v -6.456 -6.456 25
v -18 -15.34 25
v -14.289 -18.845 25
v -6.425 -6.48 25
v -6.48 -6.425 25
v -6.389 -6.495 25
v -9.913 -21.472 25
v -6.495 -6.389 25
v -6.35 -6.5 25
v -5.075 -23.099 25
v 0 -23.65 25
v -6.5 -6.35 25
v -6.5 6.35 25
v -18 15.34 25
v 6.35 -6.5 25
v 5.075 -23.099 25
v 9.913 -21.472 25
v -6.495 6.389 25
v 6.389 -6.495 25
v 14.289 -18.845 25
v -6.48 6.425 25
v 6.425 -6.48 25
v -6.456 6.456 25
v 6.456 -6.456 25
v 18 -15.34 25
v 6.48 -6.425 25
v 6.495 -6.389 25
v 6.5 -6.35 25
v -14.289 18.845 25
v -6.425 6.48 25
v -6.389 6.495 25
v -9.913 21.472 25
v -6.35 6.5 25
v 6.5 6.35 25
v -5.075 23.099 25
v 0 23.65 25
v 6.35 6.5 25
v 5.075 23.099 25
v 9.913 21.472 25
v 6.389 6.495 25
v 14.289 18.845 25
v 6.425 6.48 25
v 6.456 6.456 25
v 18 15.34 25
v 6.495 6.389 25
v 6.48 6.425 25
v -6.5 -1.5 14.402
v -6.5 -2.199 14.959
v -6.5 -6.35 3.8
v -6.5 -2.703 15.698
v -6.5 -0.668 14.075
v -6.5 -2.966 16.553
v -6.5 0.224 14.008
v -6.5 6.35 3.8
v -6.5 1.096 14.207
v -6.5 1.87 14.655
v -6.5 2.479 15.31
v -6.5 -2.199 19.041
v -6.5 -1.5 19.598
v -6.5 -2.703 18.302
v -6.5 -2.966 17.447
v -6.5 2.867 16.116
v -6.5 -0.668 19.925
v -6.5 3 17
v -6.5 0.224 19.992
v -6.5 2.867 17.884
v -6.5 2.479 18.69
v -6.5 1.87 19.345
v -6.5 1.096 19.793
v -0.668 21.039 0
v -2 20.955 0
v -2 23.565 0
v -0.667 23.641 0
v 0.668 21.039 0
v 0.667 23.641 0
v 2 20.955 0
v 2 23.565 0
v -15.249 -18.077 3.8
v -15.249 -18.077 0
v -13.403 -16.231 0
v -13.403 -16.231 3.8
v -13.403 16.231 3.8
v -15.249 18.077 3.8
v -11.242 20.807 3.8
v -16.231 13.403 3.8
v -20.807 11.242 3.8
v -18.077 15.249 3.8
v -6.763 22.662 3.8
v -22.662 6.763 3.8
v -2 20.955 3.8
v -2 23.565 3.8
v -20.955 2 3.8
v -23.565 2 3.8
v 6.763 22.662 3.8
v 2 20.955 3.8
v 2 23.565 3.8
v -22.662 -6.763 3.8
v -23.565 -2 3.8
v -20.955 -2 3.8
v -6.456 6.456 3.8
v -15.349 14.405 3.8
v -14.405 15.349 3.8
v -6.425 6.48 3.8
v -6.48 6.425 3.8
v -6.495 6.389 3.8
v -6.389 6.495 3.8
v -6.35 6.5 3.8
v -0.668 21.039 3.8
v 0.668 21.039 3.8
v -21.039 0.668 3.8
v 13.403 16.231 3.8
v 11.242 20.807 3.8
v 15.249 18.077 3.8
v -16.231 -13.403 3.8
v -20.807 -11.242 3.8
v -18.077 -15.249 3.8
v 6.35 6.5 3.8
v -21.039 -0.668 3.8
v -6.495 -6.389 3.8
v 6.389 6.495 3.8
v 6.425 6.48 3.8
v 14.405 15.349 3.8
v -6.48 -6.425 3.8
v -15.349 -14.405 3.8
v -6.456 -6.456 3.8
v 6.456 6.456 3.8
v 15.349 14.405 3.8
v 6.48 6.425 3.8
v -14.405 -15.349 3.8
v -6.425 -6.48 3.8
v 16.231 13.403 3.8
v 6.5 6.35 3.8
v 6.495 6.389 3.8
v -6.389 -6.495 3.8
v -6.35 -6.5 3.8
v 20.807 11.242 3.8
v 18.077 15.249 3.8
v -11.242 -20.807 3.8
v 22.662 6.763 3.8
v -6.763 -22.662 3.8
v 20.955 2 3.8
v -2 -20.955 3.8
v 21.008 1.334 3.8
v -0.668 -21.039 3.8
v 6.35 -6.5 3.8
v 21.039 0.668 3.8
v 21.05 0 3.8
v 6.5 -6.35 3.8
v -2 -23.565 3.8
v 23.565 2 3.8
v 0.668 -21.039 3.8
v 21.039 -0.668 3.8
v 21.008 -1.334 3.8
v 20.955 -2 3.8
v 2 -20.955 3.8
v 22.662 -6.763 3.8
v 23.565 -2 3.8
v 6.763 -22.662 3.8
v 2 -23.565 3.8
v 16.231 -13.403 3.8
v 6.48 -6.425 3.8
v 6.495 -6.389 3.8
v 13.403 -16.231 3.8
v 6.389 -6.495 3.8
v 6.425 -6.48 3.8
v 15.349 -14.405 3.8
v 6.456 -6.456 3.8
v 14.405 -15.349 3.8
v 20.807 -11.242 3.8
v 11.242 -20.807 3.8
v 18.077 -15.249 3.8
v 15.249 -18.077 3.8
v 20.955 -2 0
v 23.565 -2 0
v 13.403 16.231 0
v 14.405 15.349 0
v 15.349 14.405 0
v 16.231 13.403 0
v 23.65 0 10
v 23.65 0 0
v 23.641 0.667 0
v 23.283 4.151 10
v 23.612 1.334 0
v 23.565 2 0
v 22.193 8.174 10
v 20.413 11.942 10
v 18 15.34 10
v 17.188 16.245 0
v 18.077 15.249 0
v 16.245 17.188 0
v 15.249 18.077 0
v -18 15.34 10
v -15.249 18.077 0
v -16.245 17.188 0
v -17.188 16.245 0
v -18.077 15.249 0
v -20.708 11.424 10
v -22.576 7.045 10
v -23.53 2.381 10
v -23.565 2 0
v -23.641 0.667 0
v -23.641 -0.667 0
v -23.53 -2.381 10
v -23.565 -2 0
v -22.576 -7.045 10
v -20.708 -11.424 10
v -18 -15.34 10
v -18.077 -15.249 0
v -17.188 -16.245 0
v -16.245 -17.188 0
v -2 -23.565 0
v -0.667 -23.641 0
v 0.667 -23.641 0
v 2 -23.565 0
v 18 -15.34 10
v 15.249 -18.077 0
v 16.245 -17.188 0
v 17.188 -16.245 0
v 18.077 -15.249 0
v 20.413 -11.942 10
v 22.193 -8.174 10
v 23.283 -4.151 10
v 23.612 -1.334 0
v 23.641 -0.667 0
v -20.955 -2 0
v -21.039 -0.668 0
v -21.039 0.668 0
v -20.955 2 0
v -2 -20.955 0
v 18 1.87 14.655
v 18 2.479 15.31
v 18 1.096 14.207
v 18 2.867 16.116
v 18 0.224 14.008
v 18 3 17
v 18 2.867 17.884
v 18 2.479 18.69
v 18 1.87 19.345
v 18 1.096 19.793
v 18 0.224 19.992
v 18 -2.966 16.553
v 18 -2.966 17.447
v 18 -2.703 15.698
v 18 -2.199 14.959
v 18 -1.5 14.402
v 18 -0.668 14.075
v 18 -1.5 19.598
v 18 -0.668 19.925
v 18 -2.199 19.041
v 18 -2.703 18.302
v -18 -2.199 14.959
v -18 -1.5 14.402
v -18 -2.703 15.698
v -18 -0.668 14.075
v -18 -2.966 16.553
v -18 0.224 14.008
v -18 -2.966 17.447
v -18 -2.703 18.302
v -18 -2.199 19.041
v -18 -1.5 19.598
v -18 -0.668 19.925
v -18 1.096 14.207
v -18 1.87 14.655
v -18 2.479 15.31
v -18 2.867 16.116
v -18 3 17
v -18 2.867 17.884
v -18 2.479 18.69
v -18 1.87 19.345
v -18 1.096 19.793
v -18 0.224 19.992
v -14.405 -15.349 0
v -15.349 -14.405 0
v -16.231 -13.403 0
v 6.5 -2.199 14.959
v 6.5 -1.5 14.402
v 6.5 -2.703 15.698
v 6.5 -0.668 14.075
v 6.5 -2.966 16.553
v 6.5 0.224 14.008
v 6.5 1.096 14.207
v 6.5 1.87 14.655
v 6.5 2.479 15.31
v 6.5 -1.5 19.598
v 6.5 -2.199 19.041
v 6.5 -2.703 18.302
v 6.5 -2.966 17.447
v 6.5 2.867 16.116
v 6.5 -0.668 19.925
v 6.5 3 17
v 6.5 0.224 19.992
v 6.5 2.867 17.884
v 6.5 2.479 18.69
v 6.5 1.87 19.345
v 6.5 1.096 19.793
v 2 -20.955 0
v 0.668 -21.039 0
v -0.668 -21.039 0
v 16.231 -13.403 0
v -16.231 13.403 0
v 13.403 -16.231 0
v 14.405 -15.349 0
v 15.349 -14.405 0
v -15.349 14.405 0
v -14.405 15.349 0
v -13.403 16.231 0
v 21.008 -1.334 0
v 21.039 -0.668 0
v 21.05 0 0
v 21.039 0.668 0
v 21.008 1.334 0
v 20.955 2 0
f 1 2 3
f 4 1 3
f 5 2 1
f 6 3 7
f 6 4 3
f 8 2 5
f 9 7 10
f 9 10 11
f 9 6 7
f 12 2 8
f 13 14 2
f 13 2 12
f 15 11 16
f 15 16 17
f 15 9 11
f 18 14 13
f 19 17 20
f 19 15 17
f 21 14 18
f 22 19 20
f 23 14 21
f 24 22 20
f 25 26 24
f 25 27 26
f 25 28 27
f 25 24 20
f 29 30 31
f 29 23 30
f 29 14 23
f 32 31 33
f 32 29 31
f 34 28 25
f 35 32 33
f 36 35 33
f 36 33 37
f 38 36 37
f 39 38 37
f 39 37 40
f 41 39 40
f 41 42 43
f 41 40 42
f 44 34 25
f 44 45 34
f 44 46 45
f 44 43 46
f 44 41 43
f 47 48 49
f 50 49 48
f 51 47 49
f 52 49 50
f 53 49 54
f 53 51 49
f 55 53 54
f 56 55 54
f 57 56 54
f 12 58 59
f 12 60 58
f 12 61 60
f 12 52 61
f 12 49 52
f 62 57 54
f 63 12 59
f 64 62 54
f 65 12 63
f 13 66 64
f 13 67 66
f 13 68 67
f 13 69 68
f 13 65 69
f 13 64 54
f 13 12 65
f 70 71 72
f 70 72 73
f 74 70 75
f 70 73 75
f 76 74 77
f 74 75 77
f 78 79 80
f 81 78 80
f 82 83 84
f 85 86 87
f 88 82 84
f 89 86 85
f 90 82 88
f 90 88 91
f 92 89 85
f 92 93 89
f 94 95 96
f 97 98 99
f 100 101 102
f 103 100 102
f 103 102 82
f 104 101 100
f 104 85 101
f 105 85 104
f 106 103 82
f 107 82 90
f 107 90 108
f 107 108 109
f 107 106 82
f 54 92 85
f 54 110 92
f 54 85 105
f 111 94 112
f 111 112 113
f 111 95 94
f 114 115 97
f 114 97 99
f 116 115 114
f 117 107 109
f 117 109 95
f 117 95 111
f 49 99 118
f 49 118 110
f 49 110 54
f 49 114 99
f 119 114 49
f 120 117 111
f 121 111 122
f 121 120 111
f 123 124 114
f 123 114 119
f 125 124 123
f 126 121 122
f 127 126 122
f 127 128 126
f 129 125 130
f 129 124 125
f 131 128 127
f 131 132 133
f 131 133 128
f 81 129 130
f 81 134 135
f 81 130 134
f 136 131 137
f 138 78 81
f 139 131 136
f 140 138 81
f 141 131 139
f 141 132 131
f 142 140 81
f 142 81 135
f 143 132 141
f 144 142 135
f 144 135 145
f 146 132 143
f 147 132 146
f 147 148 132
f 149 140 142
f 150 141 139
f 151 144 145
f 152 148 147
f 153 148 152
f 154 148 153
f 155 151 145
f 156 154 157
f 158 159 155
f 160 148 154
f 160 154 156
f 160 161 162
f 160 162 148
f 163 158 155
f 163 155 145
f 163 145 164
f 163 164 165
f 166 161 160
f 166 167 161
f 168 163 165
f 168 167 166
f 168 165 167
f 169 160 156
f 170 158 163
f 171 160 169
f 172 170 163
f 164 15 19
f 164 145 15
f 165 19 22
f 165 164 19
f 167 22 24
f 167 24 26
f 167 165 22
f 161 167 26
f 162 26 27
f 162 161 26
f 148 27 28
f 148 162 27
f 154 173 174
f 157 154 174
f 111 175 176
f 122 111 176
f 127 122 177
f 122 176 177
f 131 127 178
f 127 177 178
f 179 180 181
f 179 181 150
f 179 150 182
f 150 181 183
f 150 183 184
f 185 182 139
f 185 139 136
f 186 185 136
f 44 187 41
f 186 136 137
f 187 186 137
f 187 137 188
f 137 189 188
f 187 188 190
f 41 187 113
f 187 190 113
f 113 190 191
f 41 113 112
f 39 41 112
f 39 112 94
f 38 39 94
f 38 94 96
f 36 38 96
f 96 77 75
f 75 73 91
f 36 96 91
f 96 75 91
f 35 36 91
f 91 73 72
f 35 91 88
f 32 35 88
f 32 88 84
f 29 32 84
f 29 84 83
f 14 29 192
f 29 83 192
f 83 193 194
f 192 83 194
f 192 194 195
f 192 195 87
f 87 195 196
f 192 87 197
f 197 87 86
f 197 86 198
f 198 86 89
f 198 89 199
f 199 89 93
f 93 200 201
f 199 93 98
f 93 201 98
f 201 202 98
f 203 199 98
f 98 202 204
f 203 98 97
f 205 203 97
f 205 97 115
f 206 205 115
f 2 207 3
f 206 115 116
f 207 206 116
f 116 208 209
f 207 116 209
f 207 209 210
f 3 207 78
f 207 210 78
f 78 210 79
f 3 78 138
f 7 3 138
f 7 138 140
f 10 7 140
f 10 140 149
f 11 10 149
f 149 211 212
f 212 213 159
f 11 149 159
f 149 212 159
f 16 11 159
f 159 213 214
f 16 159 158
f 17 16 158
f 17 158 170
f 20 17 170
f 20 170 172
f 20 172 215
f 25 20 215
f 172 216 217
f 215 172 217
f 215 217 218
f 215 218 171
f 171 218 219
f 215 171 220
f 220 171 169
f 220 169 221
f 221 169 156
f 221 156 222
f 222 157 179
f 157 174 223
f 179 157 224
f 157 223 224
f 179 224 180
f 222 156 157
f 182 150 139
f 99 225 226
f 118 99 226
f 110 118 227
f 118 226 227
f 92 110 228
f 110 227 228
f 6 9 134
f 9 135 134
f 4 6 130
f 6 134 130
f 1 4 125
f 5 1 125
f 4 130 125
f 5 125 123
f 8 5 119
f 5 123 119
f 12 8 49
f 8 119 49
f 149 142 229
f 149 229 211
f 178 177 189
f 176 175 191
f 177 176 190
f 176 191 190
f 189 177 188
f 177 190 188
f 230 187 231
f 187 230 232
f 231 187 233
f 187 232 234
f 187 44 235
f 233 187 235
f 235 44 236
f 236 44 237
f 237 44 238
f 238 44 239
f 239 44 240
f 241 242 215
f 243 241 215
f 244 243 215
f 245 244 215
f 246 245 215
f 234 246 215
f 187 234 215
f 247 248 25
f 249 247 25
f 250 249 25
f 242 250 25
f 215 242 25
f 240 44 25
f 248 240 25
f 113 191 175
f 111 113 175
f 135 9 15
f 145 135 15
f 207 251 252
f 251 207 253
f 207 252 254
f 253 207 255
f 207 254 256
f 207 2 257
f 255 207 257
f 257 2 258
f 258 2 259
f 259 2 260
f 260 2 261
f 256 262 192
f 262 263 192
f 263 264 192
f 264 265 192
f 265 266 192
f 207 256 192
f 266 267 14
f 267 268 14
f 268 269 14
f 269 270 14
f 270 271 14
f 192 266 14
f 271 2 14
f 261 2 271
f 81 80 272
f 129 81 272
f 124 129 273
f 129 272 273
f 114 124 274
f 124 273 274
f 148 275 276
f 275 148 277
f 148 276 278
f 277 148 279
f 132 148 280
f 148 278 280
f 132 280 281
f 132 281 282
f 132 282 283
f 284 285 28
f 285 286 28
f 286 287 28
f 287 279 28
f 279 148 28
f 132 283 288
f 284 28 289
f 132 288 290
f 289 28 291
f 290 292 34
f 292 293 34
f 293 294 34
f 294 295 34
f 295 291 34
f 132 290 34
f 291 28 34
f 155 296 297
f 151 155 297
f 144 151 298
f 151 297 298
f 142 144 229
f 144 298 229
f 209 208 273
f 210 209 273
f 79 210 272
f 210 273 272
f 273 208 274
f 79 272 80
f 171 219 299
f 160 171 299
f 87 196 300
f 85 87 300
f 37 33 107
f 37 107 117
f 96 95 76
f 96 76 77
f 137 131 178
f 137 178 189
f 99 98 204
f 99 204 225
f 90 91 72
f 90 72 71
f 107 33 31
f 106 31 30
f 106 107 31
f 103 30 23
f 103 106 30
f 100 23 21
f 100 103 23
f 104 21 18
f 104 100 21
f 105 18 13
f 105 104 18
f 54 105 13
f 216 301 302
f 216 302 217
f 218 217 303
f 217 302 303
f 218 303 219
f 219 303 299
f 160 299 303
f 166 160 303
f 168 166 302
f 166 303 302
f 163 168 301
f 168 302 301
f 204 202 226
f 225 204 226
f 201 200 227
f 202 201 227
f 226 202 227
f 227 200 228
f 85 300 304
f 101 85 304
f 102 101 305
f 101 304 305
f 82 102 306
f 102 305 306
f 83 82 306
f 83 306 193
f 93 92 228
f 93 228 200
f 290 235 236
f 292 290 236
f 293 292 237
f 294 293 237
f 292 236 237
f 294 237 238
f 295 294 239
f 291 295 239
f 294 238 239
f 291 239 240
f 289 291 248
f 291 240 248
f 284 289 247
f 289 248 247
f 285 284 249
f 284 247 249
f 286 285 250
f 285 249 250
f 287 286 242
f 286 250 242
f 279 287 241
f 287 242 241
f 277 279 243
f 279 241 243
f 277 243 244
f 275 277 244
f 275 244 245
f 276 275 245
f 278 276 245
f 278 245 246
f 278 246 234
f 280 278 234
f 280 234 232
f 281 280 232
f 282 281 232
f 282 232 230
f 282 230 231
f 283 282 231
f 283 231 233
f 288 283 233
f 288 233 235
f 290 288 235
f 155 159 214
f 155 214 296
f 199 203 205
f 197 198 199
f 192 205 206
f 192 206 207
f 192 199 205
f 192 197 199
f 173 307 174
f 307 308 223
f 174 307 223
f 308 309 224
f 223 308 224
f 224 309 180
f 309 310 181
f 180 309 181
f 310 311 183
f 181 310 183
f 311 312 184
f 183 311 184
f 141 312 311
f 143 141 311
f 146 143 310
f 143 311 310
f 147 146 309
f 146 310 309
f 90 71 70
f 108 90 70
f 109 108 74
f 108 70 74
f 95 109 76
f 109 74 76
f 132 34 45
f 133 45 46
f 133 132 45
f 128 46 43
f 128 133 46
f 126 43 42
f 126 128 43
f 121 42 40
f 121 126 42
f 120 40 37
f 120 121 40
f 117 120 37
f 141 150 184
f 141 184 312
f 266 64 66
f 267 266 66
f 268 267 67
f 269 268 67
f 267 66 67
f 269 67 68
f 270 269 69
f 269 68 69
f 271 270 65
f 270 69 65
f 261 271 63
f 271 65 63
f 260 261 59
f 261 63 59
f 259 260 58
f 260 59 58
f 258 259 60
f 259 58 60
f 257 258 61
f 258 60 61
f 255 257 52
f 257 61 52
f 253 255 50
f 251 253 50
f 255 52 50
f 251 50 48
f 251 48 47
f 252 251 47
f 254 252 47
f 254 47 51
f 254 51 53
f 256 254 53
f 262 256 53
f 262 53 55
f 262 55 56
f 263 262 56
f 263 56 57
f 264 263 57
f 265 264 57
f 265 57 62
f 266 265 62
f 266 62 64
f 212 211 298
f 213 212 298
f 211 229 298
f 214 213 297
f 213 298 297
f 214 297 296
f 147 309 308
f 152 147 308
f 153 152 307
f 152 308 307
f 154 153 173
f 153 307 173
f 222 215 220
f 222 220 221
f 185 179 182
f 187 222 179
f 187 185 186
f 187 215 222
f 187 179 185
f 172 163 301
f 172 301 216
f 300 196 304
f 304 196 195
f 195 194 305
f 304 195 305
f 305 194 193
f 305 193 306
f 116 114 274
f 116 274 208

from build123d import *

# Parameters (mm, degrees)
F0_R      = 23.65
F1_DEPTH  = 25
F3_DEPTH  = 3.8
F5_DEPTH  = 15
F6_W      = 13
F6_H      = 13
F7_DEPTH  = 25.001
F8_R      = 0.15
F9_R      = 3
F10_DEPTH = 41.651


with BuildPart() as f1:
    # F0 (on Top) → F1 (new body)
    with BuildSketch(Plane.XY):
        Circle(F0_R)
    extrude(amount=F1_DEPTH)

    # F2 (on face) → F3 (cut)
    with BuildSketch(Plane(origin=(0, 0, 0), x_dir=(1, 0, 0), z_dir=(0, 0, -1))):
        with BuildLine():
            Line((-2, 20.954773), (-2, 23.565282))
            ThreePointArc((-2, 23.565282), (-9.050463, 21.849751), (-15.248957, 18.077384))
            Line((-15.248957, 18.077384), (-13.403048, 16.231475))
            ThreePointArc((-13.403048, 16.231475), (-8.055486, 19.447664), (-2, 20.954773))
        make_face()
        with BuildLine():
            ThreePointArc((21.05, 0), (21.02618, 1.001133), (20.954773, 2))
            ThreePointArc((20.954773, 2), (19.447664, 8.055486), (16.231475, 13.403048))
            ThreePointArc((16.231475, 13.403048), (14.884598, 14.884598), (13.403048, 16.231475))
            ThreePointArc((13.403048, 16.231475), (8.055486, 19.447664), (2, 20.954773))
            ThreePointArc((2, 20.954773), (0, 21.05), (-2, 20.954773))
            ThreePointArc((-2, 20.954773), (-8.055486, 19.447664), (-13.403048, 16.231475))
            ThreePointArc((-13.403048, 16.231475), (-14.884598, 14.884598), (-16.231475, 13.403048))
            ThreePointArc((-16.231475, 13.403048), (-19.447664, 8.055486), (-20.954773, 2))
            ThreePointArc((-20.954773, 2), (-21.05, 0), (-20.954773, -2))
            ThreePointArc((-20.954773, -2), (-19.447664, -8.055486), (-16.231475, -13.403048))
            ThreePointArc((-16.231475, -13.403048), (-14.884598, -14.884598), (-13.403048, -16.231475))
            ThreePointArc((-13.403048, -16.231475), (-8.055486, -19.447664), (-2, -20.954773))
            ThreePointArc((-2, -20.954773), (0, -21.05), (2, -20.954773))
            ThreePointArc((2, -20.954773), (8.055486, -19.447664), (13.403048, -16.231475))
            ThreePointArc((13.403048, -16.231475), (14.884598, -14.884598), (16.231475, -13.403048))
            ThreePointArc((16.231475, -13.403048), (19.447664, -8.055486), (20.954773, -2))
            ThreePointArc((20.954773, -2), (21.02618, -1.001133), (21.05, 0))
        make_face()
        with BuildLine():
            Line((-16.231475, 13.403048), (-18.077384, 15.248957))
            ThreePointArc((-18.077384, 15.248957), (-21.849751, 9.050463), (-23.565282, 2))
            Line((-23.565282, 2), (-20.954773, 2))
            ThreePointArc((-20.954773, 2), (-19.447664, 8.055486), (-16.231475, 13.403048))
        make_face()
        with BuildLine():
            ThreePointArc((-23.565282, -2), (-21.849751, -9.050463), (-18.077384, -15.248957))
            Line((-18.077384, -15.248957), (-16.231475, -13.403048))
            ThreePointArc((-16.231475, -13.403048), (-19.447664, -8.055486), (-20.954773, -2))
            Line((-20.954773, -2), (-23.565282, -2))
        make_face()
        with BuildLine():
            ThreePointArc((-15.248957, -18.077384), (-9.050463, -21.849751), (-2, -23.565282))
            Line((-2, -23.565282), (-2, -20.954773))
            ThreePointArc((-2, -20.954773), (-8.055486, -19.447664), (-13.403048, -16.231475))
            Line((-13.403048, -16.231475), (-15.248957, -18.077384))
        make_face()
        with BuildLine():
            ThreePointArc((2, -23.565282), (9.050463, -21.849751), (15.248957, -18.077384))
            Line((15.248957, -18.077384), (13.403048, -16.231475))
            ThreePointArc((13.403048, -16.231475), (8.055486, -19.447664), (2, -20.954773))
            Line((2, -20.954773), (2, -23.565282))
        make_face()
        with BuildLine():
            ThreePointArc((18.077384, -15.248957), (21.849751, -9.050463), (23.565282, -2))
            Line((23.565282, -2), (20.954773, -2))
            ThreePointArc((20.954773, -2), (19.447664, -8.055486), (16.231475, -13.403048))
            Line((16.231475, -13.403048), (18.077384, -15.248957))
        make_face()
        with BuildLine():
            Line((20.954773, 2), (23.565282, 2))
            ThreePointArc((23.565282, 2), (21.849751, 9.050463), (18.077384, 15.248957))
            Line((18.077384, 15.248957), (16.231475, 13.403048))
            ThreePointArc((16.231475, 13.403048), (19.447664, 8.055486), (20.954773, 2))
        make_face()
        with BuildLine():
            Line((13.403048, 16.231475), (15.248957, 18.077384))
            ThreePointArc((15.248957, 18.077384), (9.050463, 21.849751), (2, 23.565282))
            Line((2, 23.565282), (2, 20.954773))
            ThreePointArc((2, 20.954773), (8.055486, 19.447664), (13.403048, 16.231475))
        make_face()
    extrude(amount=-F3_DEPTH, mode=Mode.SUBTRACT)

    # F4 (on face) → F5 (cut)
    with BuildSketch(Plane.XY.offset(25)):
        with BuildLine():
            Line((-18, -15.340225), (-18, 15.340225))
            ThreePointArc((-18, 15.340225), (-23.65, 0), (-18, -15.340225))
        make_face()
        with BuildLine():
            Line((18, 15.340225), (18, -15.340225))
            ThreePointArc((18, -15.340225), (23.65, 0), (18, 15.340225))
        make_face()
    extrude(amount=-F5_DEPTH, mode=Mode.SUBTRACT)

    # F6 (on face) → F7 (cut, through all)
    with BuildSketch(Plane.XY.offset(25)):
        Rectangle(F6_W, F6_H)
    extrude(amount=-F7_DEPTH, mode=Mode.SUBTRACT)

    # F8
    f8_edges = [f1.edges().sort_by_distance(p)[0] for p in [
        (-6.5, 6.5, 14.4),
        (-6.5, -6.5, 14.4),
        (6.5, 6.5, 14.4),
        (6.5, -6.5, 14.4),
    ]]
    fillet(f8_edges, radius=F8_R)

    # F9 (on face) → F10 (cut, through all)
    with BuildSketch(Plane.YZ.offset(18)):
        with Locations((0, 17)):
            Circle(F9_R)
    extrude(amount=-F10_DEPTH, mode=Mode.SUBTRACT)


solid = f1.part
